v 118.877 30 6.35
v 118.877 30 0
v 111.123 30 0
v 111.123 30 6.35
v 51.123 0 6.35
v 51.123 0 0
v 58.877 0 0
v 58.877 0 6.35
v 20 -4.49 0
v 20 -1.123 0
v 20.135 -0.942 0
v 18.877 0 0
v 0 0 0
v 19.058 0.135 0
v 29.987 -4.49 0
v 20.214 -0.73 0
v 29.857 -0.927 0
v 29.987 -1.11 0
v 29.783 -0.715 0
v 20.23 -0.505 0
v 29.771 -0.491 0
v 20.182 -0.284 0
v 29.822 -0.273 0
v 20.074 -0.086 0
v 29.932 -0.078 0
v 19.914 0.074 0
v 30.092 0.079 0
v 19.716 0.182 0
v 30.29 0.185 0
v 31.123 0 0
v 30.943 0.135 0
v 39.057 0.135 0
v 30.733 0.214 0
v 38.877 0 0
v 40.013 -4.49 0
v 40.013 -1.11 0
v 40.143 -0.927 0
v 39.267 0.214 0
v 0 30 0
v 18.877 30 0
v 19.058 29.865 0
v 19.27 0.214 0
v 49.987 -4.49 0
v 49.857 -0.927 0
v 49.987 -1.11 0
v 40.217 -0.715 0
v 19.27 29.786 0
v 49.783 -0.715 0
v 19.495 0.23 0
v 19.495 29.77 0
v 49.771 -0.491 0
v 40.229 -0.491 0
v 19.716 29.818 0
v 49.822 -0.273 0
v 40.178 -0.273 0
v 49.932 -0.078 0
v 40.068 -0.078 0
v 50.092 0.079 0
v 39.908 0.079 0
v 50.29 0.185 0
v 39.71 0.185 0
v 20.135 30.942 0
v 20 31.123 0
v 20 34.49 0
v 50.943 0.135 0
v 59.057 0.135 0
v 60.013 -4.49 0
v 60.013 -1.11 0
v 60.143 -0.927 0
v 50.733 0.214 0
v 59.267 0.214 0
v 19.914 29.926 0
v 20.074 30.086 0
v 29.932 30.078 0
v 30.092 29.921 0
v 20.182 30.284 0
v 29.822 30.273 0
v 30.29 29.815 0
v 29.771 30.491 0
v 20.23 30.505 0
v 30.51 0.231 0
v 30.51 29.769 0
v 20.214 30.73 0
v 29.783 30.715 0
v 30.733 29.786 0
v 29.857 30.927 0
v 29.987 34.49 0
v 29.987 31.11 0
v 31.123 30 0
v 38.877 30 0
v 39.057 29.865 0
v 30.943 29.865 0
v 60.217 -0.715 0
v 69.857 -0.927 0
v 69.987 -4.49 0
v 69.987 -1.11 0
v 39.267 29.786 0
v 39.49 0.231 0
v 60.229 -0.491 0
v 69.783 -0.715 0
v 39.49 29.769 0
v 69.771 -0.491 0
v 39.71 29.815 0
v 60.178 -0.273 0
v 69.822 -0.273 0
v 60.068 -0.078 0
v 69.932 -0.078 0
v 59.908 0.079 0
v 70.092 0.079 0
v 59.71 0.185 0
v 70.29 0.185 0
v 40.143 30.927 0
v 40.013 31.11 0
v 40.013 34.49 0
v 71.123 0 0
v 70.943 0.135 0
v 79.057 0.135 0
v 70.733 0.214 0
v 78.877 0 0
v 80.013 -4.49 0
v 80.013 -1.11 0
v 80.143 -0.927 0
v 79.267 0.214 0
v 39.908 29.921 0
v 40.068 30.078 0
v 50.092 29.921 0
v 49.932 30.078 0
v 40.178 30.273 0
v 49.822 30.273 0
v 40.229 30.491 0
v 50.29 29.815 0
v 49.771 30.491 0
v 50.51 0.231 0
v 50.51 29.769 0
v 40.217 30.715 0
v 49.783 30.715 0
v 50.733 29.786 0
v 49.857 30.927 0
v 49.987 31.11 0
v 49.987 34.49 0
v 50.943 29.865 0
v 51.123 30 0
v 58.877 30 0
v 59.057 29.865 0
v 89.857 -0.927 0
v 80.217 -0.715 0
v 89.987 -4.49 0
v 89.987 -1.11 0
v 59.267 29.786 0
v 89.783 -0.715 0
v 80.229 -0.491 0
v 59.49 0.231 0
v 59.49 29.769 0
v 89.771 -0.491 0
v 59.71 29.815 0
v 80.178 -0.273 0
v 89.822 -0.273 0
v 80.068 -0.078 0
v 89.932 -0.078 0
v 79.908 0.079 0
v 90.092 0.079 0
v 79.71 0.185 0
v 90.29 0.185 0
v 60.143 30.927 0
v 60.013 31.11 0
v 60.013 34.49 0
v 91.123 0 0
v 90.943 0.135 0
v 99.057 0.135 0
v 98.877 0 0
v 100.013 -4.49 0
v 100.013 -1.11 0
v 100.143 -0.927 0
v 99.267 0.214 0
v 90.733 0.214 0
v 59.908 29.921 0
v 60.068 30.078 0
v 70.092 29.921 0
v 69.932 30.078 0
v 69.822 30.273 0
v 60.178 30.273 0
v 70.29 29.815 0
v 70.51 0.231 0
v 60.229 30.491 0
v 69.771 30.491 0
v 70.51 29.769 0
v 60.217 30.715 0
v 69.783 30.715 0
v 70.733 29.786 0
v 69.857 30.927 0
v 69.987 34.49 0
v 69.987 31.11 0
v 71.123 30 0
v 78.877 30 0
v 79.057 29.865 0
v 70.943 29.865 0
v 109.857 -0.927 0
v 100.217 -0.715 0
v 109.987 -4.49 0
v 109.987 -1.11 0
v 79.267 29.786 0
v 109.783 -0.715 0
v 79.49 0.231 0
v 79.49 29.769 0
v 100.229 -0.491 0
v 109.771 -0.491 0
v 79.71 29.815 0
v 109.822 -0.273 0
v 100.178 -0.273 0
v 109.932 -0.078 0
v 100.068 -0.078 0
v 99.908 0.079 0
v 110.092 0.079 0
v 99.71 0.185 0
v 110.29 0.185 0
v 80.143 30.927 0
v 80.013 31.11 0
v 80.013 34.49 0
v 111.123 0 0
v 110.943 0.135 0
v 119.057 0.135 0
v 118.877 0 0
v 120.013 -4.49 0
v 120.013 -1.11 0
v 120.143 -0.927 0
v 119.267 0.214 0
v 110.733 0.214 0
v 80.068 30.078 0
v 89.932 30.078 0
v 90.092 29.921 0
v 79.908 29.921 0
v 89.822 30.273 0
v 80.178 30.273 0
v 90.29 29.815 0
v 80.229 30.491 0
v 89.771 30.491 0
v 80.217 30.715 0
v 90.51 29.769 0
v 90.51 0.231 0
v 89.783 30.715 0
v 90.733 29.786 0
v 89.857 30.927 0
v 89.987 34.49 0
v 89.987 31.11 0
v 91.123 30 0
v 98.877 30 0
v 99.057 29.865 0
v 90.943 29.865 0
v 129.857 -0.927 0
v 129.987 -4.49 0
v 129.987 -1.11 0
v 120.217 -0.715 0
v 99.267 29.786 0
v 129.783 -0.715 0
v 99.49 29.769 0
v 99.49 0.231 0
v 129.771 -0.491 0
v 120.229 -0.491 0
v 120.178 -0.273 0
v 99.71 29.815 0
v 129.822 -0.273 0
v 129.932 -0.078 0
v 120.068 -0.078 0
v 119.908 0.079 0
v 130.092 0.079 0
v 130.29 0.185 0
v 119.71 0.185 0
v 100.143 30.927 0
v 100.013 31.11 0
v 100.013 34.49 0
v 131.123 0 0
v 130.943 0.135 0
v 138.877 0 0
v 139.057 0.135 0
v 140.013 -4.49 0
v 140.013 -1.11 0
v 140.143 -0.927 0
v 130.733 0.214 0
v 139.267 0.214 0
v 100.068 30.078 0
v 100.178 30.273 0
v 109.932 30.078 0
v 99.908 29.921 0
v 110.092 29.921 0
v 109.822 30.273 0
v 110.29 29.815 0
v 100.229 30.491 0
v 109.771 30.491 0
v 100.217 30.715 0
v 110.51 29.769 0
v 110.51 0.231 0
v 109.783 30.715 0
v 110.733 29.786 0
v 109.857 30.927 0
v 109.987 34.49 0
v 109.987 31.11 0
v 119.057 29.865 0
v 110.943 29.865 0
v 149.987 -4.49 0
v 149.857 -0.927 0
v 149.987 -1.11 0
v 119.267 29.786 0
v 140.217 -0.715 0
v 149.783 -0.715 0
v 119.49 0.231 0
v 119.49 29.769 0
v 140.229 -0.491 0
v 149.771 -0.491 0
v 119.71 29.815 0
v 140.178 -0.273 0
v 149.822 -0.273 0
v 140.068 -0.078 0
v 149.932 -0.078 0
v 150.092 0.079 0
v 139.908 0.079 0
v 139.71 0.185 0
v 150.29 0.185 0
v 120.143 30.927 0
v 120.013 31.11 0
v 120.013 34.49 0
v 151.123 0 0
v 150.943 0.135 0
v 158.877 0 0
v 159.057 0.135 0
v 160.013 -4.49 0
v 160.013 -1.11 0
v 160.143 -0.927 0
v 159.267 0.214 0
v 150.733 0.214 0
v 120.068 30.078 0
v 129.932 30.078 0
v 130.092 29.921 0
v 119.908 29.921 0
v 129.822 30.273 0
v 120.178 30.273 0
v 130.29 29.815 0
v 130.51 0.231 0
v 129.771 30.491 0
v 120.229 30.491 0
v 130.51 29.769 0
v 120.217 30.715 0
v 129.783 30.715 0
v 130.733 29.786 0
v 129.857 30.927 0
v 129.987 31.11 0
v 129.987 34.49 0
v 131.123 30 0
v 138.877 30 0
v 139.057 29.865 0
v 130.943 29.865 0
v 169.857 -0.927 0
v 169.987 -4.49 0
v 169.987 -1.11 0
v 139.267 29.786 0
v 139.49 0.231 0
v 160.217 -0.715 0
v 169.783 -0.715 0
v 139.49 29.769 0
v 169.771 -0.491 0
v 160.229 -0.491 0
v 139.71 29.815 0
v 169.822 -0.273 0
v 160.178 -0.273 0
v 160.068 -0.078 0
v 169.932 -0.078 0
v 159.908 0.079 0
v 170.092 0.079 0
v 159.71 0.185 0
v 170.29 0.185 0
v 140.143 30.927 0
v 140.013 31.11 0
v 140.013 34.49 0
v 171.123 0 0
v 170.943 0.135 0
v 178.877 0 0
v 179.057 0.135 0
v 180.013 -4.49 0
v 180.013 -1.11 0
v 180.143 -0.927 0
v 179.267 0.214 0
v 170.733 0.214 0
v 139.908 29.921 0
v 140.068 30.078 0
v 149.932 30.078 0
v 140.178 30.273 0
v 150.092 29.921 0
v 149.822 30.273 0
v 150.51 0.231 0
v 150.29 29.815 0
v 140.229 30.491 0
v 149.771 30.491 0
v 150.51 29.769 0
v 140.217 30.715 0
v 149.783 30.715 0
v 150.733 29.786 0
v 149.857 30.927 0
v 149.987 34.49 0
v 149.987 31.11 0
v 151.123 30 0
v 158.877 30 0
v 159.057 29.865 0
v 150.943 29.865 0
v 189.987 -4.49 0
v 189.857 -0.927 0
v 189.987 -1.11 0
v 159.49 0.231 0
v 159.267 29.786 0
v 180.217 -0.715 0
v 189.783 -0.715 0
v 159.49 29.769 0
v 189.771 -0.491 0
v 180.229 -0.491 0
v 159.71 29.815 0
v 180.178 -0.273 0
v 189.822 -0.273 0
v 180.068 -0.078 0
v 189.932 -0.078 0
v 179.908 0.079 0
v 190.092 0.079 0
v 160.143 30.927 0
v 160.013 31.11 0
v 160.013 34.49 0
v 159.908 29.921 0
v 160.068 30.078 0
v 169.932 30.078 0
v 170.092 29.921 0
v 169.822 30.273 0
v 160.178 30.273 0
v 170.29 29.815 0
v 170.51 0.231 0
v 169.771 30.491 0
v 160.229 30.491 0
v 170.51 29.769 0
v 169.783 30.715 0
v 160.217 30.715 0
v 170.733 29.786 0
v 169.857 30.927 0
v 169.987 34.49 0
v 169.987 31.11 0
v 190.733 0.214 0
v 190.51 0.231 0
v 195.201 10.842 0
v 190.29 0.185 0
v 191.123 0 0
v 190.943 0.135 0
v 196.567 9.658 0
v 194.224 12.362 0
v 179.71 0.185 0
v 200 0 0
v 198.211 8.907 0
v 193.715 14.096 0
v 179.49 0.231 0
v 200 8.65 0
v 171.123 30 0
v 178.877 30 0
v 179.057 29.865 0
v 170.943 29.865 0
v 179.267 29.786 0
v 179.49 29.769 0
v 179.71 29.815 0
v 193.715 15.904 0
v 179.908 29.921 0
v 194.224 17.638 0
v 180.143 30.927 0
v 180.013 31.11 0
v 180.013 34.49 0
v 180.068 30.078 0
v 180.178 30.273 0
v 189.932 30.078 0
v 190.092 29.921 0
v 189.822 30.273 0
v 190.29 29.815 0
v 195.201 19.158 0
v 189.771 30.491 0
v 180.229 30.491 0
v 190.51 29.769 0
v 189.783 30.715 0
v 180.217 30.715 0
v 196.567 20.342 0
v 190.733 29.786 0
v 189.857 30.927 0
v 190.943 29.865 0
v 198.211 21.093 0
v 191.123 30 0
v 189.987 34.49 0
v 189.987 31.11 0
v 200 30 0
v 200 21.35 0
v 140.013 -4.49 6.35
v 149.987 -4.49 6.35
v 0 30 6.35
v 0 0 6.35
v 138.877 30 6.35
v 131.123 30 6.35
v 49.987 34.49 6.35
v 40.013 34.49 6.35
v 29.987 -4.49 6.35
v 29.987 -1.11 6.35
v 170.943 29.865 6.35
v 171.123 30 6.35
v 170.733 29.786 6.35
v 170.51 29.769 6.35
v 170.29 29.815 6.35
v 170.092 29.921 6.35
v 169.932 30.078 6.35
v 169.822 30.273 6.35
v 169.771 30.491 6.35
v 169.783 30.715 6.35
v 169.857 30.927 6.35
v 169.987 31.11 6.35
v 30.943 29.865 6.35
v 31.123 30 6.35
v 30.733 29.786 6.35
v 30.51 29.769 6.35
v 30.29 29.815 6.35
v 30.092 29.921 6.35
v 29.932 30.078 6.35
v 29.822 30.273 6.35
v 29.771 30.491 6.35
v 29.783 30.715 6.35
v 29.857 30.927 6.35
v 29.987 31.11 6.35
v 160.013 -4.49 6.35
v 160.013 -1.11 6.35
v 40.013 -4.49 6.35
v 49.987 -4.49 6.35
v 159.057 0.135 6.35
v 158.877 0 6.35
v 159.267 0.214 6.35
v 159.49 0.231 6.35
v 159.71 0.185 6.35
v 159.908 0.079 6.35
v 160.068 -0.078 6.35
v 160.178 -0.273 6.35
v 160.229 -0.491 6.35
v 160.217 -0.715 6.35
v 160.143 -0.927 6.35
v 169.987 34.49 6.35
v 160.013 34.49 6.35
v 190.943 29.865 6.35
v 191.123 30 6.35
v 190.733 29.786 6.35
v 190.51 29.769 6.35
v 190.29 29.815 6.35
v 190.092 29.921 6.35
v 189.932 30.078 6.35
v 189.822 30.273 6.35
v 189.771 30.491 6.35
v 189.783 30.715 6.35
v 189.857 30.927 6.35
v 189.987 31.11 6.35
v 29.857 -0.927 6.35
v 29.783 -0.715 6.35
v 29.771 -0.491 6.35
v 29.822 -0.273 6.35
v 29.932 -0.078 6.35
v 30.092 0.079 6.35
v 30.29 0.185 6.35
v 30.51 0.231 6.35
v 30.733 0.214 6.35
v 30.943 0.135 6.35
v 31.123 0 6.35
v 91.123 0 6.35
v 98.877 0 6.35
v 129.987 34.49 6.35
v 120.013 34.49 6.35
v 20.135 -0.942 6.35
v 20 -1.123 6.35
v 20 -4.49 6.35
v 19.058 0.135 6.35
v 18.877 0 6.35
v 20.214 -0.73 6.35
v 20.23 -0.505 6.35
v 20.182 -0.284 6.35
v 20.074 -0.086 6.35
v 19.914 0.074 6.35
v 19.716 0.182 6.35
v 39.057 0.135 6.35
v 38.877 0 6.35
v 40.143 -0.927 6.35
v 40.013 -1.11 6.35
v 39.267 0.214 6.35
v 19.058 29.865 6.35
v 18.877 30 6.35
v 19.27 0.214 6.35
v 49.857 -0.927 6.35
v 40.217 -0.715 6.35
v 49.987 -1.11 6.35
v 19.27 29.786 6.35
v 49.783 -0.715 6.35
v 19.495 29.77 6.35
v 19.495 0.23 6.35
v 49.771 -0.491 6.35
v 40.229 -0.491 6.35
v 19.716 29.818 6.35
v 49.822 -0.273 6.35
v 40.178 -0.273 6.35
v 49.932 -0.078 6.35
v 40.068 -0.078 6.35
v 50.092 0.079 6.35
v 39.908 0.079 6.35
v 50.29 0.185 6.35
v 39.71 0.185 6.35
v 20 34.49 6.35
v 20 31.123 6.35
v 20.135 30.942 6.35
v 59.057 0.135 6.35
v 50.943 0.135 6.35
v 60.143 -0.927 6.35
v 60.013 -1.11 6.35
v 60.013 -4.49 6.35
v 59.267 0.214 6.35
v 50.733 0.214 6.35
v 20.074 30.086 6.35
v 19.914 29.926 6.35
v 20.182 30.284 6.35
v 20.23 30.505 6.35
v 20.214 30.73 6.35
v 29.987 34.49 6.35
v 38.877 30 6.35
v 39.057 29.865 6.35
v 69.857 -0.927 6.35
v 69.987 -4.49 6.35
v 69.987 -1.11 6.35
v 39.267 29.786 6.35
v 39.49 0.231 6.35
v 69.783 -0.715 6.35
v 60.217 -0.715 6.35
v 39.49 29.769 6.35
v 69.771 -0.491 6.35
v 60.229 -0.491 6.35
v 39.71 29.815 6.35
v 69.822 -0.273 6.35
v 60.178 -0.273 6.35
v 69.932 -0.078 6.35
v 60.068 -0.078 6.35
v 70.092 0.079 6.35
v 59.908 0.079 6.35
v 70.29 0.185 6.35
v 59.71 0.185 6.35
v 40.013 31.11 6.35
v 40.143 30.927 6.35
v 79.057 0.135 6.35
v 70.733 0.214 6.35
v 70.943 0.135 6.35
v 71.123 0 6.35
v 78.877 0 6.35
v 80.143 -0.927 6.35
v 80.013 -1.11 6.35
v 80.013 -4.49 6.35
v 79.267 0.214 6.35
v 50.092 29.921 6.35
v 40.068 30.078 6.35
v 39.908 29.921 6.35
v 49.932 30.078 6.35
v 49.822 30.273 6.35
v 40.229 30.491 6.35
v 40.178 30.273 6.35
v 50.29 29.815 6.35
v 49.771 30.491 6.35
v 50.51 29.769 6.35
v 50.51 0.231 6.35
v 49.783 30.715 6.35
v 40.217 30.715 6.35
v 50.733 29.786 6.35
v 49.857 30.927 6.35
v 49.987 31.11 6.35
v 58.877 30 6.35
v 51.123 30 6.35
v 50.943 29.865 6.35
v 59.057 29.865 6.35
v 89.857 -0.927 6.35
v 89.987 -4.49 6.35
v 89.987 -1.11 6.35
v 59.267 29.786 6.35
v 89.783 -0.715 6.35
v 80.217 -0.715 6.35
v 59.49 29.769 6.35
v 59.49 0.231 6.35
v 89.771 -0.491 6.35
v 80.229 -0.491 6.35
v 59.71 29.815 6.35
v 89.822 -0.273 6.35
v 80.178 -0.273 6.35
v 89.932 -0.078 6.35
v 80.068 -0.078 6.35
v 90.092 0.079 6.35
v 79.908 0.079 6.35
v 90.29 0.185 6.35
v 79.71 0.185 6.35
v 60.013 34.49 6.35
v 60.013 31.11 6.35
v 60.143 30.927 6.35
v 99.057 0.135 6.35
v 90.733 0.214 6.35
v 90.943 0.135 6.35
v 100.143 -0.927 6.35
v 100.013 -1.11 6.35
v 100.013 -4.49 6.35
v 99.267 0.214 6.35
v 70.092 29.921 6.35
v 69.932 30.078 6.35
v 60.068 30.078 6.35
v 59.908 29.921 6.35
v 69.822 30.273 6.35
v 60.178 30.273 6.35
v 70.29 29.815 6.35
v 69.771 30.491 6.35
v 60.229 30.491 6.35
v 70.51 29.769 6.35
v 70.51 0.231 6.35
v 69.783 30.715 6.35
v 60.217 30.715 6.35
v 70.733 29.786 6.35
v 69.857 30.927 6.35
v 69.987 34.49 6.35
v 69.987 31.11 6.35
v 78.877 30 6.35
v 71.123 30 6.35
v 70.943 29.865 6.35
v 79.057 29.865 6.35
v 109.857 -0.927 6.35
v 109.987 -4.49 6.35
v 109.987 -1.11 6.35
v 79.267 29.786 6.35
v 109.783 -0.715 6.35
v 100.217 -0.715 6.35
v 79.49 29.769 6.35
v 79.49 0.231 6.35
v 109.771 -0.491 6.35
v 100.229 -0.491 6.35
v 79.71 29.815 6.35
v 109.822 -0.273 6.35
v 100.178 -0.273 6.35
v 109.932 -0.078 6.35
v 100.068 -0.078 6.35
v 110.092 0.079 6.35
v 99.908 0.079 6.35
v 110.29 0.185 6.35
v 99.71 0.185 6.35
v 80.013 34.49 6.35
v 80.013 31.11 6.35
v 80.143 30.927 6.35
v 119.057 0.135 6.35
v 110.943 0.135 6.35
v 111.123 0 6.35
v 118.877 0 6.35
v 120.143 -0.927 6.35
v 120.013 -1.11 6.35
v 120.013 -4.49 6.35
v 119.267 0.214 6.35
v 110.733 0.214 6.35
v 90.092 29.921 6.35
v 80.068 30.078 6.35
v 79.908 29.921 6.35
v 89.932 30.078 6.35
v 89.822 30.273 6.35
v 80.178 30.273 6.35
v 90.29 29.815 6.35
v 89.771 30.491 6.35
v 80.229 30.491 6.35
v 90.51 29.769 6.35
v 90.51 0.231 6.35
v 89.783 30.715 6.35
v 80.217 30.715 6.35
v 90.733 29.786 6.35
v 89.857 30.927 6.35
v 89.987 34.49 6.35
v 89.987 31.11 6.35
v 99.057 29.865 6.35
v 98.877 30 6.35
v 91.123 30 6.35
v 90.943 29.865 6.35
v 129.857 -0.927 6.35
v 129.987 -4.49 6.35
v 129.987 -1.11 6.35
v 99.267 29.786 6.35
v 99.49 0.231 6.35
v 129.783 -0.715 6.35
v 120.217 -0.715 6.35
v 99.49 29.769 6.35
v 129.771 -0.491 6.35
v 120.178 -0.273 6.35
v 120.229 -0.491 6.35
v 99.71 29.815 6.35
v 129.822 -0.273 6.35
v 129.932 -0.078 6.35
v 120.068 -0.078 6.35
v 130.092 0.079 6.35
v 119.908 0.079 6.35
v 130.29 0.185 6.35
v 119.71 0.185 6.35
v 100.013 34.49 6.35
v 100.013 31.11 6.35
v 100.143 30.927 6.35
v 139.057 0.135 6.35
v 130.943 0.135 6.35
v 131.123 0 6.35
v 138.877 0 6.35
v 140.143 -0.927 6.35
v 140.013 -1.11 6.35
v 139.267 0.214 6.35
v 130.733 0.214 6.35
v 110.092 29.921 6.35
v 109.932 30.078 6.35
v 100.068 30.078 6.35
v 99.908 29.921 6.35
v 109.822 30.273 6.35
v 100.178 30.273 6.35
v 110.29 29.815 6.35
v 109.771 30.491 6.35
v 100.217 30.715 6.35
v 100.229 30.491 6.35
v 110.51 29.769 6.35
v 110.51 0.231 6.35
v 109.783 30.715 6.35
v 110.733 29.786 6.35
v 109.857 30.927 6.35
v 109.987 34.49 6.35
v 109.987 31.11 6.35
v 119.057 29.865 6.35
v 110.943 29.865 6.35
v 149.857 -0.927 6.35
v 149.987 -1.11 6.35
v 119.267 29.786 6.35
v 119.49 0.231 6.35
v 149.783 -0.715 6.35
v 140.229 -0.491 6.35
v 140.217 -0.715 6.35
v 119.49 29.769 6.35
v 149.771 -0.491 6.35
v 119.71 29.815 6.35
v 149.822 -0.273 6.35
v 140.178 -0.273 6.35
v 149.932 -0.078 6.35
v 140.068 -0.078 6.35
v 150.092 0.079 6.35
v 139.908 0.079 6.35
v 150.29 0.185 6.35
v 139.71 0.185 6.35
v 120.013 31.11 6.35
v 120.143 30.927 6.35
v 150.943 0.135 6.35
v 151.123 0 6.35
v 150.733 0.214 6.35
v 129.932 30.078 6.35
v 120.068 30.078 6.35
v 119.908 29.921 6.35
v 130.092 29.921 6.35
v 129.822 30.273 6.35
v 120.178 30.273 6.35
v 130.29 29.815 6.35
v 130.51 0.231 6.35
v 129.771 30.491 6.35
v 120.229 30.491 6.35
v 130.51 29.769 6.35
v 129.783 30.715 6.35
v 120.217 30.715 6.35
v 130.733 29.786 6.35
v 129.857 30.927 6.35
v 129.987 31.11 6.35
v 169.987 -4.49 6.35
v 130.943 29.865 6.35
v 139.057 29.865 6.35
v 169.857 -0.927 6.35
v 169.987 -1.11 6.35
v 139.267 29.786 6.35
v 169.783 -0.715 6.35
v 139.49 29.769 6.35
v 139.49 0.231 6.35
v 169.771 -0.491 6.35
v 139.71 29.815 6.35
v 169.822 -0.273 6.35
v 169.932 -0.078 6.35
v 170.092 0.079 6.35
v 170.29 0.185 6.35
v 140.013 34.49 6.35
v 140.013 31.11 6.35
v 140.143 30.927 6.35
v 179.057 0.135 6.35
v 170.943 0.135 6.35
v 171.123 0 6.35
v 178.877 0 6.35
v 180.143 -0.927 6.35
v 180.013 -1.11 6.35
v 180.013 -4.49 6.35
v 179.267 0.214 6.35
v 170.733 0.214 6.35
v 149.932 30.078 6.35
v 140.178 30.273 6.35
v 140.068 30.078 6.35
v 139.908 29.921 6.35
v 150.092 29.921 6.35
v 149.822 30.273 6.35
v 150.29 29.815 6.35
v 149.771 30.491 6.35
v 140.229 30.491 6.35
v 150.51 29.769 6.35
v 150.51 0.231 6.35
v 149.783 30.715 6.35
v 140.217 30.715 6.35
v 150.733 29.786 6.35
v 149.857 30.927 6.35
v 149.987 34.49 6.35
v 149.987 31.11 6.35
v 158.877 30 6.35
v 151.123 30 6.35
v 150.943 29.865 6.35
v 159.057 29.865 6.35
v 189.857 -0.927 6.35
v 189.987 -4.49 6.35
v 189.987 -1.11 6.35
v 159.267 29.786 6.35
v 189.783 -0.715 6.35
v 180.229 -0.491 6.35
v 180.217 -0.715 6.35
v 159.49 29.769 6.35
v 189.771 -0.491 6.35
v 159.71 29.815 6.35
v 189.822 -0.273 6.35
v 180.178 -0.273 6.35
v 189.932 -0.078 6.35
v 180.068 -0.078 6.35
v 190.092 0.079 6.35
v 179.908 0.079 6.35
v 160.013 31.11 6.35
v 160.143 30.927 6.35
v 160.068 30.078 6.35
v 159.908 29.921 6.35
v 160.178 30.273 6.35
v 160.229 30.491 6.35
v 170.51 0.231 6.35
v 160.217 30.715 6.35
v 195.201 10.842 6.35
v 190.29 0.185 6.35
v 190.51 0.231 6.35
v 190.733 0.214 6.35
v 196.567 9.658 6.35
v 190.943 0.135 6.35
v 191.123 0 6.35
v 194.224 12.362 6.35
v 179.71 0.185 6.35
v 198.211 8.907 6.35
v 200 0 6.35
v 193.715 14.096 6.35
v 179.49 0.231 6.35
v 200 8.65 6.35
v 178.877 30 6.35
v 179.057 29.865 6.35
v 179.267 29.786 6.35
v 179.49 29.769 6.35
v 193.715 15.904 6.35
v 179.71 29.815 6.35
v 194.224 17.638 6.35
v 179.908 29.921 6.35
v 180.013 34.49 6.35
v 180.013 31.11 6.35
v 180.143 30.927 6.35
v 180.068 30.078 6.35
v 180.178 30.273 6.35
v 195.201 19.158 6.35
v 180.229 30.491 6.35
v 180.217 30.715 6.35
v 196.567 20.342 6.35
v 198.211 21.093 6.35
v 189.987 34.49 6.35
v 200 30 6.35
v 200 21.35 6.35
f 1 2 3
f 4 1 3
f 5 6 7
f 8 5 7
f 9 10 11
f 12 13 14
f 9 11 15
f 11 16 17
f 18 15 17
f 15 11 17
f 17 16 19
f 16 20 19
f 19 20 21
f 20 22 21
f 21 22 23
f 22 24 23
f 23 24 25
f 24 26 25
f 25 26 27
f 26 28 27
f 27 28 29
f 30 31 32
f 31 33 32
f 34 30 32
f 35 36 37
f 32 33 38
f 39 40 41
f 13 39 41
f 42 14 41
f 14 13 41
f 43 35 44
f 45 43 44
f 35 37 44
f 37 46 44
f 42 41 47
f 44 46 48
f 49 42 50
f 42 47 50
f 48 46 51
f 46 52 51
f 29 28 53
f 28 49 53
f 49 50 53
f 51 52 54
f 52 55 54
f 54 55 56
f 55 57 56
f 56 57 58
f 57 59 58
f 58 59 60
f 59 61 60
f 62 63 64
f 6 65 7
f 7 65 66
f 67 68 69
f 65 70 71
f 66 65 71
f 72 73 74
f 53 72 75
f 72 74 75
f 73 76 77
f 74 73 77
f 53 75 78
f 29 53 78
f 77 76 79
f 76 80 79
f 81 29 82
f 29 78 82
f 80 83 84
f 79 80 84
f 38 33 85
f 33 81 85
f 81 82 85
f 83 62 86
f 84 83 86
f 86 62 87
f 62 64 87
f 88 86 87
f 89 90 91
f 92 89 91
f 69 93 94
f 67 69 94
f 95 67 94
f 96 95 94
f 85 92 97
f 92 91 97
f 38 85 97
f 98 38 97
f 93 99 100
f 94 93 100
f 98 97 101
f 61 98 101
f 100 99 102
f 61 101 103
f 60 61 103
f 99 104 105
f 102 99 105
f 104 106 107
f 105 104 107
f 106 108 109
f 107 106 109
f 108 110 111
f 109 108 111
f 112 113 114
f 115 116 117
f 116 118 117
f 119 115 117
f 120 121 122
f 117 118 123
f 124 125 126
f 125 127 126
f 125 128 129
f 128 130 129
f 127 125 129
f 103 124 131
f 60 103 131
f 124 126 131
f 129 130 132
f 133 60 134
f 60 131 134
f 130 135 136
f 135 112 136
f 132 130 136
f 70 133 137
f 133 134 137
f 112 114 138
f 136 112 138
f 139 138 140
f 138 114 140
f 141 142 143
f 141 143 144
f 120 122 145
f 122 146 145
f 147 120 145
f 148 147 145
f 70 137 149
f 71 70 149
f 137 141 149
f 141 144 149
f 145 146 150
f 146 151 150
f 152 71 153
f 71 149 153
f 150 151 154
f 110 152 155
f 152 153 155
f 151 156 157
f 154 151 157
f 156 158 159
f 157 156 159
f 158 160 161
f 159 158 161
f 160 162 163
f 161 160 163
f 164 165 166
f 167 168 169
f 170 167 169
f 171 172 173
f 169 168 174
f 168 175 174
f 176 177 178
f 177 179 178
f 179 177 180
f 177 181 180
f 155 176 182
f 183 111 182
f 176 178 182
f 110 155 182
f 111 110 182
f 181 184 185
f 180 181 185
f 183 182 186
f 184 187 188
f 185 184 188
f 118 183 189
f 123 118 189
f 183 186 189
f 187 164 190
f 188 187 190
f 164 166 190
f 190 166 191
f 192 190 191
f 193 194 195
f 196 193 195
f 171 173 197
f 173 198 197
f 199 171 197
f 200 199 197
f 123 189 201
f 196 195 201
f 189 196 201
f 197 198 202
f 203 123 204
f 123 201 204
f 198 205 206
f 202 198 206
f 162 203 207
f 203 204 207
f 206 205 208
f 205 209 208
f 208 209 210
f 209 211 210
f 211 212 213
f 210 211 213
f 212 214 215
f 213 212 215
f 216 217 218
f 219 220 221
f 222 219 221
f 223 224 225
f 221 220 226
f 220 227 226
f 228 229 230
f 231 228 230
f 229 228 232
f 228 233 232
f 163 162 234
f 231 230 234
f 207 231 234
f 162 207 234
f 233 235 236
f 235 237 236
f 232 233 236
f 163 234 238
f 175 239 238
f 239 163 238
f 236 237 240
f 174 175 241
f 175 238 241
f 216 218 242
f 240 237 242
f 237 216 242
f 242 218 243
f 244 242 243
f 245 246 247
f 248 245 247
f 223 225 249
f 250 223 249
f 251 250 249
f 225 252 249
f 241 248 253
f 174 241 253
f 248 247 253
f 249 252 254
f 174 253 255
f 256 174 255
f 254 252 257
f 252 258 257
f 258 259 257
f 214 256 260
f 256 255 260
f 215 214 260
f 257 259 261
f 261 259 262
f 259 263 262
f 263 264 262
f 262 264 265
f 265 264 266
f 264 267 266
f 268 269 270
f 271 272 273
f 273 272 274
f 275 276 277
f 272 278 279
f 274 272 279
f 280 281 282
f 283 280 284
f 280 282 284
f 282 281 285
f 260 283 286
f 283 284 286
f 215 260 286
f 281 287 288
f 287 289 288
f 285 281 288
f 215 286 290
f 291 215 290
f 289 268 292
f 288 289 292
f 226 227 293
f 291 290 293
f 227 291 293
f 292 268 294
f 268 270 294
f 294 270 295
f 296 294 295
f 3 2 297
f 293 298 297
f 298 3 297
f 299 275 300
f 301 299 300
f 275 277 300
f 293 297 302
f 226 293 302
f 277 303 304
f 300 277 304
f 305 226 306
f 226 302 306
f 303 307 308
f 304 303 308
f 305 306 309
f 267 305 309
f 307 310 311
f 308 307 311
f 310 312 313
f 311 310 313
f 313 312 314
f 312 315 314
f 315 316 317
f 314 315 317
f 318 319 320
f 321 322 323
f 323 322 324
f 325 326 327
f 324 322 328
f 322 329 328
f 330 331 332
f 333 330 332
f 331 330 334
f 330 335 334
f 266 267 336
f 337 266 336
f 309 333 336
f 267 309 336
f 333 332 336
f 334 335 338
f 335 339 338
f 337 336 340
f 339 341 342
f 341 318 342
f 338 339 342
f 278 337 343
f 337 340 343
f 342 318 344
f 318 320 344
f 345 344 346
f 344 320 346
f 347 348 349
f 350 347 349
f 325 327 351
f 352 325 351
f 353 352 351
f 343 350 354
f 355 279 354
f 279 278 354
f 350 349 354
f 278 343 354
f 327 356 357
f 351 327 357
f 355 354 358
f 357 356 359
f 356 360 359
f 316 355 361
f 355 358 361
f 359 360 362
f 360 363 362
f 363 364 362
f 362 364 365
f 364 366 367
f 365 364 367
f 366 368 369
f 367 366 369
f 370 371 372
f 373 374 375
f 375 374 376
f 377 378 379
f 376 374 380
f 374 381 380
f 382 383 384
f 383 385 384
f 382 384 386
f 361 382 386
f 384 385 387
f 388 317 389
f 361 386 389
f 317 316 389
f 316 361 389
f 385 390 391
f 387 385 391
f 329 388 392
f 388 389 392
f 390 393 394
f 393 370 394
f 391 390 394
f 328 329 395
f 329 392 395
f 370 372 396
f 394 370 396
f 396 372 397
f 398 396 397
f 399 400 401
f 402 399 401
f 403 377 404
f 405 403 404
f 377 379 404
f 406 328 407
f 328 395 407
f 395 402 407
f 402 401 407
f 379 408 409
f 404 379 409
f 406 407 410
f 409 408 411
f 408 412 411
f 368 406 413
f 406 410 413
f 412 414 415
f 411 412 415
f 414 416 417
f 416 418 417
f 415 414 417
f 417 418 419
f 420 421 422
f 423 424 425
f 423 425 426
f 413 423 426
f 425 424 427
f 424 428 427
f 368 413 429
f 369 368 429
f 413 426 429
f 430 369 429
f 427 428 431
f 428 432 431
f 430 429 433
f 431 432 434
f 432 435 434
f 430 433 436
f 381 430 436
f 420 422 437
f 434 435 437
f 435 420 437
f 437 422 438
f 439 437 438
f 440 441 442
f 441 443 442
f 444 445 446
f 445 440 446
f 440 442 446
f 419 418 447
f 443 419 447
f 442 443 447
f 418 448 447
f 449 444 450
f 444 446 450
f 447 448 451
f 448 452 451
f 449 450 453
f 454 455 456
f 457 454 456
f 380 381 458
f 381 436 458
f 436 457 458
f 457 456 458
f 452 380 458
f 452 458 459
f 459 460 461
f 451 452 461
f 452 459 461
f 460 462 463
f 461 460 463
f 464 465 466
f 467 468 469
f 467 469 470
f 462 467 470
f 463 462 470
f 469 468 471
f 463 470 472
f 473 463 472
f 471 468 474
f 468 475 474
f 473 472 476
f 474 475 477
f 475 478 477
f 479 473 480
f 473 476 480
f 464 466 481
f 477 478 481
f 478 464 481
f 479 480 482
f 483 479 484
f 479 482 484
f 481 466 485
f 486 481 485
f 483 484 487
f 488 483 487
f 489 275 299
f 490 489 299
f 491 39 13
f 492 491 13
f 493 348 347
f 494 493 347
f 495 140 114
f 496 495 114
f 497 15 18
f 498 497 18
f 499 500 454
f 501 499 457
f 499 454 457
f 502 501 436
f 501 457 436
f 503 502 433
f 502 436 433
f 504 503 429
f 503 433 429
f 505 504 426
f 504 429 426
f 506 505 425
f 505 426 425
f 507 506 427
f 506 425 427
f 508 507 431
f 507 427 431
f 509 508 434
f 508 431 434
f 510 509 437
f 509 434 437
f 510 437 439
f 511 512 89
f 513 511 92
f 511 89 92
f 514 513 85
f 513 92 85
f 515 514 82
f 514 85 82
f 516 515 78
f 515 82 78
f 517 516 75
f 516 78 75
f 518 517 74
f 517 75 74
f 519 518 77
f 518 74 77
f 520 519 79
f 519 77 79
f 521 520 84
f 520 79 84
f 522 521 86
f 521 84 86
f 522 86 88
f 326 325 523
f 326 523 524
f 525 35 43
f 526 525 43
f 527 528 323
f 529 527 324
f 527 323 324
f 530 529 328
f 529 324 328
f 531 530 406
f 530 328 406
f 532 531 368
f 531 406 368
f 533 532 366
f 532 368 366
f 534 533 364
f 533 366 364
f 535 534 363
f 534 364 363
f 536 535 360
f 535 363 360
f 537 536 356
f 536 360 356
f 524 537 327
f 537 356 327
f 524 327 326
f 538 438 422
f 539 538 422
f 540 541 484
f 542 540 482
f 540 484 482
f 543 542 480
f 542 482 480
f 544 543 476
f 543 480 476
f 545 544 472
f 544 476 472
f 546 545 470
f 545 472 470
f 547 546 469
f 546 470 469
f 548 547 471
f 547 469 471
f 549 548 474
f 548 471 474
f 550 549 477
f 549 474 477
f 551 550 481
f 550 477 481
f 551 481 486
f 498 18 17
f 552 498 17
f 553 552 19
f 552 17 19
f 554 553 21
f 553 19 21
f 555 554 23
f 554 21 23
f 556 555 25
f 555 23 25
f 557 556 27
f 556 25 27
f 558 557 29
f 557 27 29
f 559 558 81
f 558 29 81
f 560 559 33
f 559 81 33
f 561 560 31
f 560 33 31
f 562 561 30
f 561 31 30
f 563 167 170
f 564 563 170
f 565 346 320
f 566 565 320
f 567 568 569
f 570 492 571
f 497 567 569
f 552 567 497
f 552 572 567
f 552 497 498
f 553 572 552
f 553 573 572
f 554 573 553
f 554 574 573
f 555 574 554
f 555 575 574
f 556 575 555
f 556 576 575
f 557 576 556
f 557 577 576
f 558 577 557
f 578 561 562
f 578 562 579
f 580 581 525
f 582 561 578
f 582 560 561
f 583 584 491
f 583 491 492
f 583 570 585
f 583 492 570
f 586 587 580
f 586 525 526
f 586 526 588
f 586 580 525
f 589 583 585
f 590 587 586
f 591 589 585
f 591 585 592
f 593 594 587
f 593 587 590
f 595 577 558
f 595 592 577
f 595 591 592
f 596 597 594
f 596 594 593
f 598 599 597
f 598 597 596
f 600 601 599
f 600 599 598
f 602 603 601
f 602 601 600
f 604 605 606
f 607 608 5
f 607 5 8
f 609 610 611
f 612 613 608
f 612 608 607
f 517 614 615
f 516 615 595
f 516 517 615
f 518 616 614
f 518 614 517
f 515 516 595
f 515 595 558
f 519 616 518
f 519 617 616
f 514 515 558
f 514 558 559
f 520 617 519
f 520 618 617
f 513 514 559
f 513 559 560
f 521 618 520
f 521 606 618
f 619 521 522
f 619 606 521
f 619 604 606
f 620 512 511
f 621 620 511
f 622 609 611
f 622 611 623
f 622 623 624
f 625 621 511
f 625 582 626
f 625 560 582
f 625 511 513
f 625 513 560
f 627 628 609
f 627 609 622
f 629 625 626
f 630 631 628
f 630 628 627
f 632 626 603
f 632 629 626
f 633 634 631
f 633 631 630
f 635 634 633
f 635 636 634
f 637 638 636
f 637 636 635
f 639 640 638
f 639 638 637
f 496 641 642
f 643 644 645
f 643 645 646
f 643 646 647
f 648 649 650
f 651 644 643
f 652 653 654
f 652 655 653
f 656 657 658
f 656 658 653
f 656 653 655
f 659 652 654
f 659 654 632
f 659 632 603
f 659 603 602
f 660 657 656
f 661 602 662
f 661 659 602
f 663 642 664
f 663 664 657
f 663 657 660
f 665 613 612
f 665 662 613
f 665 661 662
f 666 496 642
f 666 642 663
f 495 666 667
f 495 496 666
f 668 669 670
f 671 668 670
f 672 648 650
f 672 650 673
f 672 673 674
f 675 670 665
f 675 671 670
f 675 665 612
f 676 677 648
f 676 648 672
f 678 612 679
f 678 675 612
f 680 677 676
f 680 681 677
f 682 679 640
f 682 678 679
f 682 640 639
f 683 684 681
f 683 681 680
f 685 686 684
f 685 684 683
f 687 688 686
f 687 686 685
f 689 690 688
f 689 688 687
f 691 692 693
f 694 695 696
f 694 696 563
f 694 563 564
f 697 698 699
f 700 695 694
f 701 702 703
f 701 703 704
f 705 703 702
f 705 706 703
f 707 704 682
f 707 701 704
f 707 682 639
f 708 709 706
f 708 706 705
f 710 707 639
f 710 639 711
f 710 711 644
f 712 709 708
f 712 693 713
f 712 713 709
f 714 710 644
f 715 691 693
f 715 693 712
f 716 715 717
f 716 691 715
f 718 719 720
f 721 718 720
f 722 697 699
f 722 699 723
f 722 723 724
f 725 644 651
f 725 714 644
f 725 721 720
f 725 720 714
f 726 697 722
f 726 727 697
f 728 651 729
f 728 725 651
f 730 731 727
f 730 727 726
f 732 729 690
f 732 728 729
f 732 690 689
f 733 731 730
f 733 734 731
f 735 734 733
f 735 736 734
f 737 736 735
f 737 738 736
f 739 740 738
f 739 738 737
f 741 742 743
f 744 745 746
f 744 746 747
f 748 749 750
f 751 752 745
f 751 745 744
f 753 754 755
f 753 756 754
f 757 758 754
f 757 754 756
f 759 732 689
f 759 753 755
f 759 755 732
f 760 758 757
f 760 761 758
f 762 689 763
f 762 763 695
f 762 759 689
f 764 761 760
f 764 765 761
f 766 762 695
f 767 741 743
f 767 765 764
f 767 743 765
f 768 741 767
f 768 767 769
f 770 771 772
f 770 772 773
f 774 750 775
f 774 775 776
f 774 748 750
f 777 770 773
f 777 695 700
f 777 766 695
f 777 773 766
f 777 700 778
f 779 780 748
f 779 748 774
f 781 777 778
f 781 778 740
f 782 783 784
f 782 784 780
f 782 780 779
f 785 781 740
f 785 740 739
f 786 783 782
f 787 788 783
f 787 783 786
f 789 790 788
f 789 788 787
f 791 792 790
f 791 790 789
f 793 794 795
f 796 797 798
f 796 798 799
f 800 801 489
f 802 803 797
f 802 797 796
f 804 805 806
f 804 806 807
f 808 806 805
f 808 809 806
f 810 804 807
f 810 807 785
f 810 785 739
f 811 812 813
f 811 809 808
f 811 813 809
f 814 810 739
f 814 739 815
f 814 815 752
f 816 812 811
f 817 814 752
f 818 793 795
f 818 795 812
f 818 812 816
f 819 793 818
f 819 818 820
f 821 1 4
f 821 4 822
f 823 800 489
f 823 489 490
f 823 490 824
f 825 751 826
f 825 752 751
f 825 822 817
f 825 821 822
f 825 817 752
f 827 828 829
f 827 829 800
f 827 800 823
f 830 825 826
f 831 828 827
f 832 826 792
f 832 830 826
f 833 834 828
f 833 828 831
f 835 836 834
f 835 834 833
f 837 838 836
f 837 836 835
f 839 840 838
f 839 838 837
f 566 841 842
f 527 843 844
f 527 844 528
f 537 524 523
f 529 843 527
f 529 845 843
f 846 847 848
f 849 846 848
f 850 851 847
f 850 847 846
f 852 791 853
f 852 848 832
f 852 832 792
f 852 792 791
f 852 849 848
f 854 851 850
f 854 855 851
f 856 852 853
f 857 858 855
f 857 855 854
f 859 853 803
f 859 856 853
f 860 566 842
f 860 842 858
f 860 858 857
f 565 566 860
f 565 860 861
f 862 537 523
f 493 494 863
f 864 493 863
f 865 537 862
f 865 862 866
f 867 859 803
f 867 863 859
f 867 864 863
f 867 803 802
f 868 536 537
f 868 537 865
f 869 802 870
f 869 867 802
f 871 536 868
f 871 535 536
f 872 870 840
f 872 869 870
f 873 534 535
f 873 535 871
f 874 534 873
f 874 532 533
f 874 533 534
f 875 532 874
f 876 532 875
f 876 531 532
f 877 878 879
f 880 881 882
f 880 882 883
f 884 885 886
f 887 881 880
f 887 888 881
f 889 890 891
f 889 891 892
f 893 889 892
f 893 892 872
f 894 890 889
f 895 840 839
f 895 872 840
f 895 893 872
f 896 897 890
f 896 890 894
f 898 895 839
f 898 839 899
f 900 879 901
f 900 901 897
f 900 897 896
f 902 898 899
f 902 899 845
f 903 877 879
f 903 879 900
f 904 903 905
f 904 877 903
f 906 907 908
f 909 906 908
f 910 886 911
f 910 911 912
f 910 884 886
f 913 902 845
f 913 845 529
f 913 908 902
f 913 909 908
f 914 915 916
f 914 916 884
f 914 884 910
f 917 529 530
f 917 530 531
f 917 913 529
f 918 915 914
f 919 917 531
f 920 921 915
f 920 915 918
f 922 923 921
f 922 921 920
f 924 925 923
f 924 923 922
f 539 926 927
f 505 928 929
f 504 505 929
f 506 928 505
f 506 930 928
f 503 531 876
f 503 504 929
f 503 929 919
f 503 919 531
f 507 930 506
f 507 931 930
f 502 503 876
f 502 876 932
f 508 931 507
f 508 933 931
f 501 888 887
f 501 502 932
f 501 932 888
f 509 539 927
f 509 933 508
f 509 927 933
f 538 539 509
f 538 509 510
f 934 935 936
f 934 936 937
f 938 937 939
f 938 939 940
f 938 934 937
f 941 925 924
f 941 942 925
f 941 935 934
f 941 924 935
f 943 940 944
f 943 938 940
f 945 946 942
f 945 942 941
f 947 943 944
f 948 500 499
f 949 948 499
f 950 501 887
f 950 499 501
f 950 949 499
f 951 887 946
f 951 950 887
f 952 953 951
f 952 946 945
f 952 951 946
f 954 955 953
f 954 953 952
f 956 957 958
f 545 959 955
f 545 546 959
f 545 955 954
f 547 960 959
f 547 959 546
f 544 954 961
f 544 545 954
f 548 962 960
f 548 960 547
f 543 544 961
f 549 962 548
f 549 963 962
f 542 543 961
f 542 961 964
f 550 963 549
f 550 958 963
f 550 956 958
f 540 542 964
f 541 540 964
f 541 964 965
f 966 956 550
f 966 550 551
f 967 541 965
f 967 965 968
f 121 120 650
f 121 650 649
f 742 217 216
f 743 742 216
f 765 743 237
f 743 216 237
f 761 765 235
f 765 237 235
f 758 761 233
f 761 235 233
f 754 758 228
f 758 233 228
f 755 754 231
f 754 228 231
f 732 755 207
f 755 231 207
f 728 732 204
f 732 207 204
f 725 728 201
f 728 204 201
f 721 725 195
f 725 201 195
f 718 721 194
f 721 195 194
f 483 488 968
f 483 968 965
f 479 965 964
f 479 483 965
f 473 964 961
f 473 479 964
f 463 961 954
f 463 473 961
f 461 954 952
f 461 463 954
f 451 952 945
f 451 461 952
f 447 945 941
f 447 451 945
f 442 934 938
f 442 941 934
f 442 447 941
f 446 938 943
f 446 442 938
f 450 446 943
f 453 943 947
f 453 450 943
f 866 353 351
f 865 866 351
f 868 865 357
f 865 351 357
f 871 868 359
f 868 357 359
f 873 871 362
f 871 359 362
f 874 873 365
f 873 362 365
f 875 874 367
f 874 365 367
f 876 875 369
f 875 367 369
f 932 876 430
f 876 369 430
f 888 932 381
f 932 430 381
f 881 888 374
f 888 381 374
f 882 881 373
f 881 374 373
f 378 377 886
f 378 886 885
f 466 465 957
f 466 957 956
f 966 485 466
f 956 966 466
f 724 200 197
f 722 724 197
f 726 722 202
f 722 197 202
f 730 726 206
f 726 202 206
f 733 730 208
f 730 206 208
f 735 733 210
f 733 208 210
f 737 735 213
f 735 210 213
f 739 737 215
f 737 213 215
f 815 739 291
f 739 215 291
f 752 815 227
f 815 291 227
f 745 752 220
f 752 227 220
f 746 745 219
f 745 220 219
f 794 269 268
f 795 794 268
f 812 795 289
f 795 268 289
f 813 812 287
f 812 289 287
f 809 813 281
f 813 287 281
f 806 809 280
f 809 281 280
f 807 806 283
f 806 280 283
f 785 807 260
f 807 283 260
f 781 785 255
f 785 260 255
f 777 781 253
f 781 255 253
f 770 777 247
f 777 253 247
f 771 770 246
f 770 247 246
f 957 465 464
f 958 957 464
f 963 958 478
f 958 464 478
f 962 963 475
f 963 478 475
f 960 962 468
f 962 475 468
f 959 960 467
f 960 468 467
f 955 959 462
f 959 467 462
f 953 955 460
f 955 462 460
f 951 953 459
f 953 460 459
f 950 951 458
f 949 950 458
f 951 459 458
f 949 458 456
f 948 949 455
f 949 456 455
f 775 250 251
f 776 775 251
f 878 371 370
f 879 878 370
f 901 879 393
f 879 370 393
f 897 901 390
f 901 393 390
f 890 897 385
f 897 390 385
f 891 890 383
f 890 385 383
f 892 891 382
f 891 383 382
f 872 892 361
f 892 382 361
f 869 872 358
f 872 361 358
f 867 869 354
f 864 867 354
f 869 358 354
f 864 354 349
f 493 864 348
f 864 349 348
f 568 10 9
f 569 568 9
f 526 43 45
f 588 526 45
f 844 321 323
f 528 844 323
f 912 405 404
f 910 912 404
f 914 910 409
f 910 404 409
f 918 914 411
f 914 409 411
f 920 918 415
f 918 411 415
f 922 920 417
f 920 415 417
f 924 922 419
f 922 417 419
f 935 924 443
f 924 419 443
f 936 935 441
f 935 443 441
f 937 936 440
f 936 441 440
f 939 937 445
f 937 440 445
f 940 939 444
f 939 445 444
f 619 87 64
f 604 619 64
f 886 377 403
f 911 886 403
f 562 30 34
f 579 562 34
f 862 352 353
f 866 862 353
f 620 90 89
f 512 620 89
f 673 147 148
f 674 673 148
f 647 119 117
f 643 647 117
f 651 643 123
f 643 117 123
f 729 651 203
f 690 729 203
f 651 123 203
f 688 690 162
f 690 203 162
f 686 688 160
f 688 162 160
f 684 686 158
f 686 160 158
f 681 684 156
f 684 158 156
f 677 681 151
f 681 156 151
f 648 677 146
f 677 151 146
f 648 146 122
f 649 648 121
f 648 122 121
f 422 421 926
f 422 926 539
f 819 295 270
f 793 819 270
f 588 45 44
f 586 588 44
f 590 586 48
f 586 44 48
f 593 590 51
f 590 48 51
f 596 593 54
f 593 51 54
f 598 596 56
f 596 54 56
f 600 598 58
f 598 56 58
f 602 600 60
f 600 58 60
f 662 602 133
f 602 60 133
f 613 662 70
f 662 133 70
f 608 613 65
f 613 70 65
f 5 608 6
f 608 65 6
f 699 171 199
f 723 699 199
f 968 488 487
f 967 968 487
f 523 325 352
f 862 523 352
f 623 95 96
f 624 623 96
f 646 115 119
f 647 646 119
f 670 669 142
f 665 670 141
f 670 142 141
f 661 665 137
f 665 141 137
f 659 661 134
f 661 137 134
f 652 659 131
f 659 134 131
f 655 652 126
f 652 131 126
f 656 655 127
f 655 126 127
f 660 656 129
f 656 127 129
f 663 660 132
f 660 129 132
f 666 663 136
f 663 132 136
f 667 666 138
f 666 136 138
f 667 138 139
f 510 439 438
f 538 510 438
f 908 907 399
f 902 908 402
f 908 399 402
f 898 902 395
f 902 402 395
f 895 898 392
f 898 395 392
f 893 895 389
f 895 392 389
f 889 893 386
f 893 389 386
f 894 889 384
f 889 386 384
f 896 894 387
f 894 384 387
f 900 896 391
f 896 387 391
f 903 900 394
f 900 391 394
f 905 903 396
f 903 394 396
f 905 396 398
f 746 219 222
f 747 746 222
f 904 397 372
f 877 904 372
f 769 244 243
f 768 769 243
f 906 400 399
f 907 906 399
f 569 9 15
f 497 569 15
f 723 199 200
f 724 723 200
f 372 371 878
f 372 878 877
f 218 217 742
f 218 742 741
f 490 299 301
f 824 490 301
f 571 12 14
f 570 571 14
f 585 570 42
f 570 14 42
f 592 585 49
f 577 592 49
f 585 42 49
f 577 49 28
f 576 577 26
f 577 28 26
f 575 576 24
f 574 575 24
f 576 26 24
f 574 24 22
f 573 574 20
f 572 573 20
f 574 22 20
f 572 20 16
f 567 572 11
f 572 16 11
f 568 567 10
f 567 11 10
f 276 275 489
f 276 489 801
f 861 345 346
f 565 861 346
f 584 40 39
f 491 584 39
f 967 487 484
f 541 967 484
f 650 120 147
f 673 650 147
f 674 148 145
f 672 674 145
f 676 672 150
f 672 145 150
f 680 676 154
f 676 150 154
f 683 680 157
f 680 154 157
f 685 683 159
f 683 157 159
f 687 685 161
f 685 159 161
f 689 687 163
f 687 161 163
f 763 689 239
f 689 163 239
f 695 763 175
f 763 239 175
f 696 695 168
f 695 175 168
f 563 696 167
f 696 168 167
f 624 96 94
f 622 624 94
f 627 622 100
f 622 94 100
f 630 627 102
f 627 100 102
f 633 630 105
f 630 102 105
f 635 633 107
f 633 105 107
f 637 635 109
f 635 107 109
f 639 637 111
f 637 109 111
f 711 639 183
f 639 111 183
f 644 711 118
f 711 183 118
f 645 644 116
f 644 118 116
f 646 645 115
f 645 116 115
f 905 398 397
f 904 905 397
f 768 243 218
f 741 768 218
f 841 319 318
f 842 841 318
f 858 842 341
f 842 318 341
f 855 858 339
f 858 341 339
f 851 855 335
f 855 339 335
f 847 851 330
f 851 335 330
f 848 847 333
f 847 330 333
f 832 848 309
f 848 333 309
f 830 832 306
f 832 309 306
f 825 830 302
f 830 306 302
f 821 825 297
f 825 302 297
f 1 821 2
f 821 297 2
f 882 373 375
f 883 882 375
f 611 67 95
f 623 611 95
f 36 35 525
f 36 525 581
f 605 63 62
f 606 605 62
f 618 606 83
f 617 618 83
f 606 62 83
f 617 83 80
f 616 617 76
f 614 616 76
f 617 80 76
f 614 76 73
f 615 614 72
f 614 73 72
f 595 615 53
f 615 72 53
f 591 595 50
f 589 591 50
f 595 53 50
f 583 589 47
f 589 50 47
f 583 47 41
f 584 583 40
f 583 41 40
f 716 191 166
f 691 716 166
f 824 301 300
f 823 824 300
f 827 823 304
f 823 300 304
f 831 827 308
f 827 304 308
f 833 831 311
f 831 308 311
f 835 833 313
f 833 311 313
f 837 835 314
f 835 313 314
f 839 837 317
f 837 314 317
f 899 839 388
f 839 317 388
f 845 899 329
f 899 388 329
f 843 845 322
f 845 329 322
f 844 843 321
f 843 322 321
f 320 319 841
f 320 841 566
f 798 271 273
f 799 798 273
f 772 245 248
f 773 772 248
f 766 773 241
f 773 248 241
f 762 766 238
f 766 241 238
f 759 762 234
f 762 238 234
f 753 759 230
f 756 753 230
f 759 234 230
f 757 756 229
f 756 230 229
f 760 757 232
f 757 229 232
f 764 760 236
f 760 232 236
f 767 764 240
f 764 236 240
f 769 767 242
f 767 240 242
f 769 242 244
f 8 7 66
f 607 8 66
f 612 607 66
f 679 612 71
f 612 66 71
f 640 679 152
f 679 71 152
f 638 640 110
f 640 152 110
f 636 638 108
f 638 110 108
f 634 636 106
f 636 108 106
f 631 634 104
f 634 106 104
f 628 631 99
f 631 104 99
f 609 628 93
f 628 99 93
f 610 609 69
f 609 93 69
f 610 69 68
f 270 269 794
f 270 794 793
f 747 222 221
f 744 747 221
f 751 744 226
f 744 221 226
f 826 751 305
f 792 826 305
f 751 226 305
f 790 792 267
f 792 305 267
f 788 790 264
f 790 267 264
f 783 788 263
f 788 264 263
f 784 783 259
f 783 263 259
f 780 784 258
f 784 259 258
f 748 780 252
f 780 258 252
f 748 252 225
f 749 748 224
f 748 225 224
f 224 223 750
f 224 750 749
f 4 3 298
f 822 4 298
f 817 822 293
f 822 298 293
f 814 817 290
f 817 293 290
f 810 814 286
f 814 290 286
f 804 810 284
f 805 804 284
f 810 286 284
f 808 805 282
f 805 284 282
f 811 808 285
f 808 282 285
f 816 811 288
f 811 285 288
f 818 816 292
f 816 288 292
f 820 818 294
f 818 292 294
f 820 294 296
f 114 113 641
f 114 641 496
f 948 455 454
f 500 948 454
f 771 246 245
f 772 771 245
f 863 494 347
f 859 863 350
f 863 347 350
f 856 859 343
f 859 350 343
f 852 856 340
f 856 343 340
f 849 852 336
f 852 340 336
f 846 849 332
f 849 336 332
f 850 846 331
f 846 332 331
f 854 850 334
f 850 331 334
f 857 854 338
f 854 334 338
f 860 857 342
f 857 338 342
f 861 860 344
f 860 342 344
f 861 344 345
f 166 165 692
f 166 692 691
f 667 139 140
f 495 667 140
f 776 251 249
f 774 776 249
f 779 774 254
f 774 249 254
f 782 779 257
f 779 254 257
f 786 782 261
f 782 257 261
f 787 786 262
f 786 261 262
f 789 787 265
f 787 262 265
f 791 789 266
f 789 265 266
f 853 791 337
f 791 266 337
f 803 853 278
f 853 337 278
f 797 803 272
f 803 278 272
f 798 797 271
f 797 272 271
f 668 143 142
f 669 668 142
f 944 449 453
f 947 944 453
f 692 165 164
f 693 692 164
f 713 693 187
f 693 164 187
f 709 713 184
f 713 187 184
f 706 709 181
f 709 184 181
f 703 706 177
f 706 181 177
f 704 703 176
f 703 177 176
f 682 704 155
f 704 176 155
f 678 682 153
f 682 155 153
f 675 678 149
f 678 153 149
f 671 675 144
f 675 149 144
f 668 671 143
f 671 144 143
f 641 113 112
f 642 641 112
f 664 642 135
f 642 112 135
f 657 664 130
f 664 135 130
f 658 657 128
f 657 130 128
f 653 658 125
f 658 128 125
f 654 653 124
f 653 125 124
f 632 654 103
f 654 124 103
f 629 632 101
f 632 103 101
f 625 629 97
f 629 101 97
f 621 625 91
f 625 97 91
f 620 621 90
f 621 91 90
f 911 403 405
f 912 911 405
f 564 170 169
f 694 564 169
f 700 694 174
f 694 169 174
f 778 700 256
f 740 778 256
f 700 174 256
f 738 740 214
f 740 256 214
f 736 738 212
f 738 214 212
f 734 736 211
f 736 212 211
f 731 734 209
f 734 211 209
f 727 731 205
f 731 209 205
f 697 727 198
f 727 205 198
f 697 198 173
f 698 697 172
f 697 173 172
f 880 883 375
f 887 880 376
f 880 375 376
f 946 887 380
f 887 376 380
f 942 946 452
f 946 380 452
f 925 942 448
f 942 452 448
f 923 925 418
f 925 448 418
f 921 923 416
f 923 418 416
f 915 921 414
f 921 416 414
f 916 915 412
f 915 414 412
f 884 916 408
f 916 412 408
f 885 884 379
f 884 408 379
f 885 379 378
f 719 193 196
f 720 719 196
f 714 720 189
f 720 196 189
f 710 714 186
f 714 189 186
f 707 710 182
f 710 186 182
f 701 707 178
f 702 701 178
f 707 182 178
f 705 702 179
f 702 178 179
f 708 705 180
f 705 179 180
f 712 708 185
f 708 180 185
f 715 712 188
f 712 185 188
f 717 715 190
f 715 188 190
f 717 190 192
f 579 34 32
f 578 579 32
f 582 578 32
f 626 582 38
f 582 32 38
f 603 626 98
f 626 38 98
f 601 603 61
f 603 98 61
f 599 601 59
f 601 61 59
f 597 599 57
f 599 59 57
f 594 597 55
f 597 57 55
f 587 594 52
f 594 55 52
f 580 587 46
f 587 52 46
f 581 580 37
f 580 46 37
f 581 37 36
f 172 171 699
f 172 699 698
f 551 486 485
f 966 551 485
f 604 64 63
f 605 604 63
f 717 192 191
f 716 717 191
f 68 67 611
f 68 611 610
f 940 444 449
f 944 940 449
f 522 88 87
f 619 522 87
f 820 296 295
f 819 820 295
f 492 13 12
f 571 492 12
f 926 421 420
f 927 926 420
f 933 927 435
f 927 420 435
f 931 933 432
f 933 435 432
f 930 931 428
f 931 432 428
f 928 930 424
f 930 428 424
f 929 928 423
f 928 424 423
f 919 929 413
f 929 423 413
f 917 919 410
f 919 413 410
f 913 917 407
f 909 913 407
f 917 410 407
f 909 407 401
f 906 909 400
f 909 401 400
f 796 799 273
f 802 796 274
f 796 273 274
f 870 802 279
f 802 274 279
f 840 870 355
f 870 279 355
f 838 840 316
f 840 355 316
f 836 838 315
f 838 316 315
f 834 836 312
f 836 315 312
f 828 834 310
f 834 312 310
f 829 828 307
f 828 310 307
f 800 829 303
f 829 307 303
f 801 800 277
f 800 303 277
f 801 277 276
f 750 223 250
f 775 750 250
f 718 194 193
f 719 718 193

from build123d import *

# Parameters (mm, degrees)
BOSS_EXTRUDE1_DEPTH = 6.35
SKETCH2_W           = 10.0254
SKETCH2_H           = 4.477133961
CUT_EXTRUDE2_DEPTH  = 204.051450213
LPATTERN1_COUNT     = 9
LPATTERN1_PITCH     = 20
CUT_EXTRUDE5_DEPTH  = 204.051450213


# Read off the part's stored shape, not the designer's step: Boss-Extrude1
with BuildPart() as part:
    # Boss-Extrude1 outline → Boss-Extrude1 (new body)
    with BuildSketch(Plane.XY):
        with BuildLine():
            Line((190, -4.490128061), (190, -1.122532015))
            ThreePointArc((190, -1.122532015), (190, 0), (191.122532015, 0))
            Line((191.122532015, 0), (200, 0))
            Line((200, 0), (200, 30))
            Line((200, 30), (191.122532015, 30))
            ThreePointArc((191.122532015, 30), (190, 30), (190, 31.122532015))
            Line((190, 31.122532015), (190, 34.490128061))
            Line((190, 34.490128061), (180, 34.490128061))
            Line((180, 34.490128061), (180, 31.122532015))
            ThreePointArc((180, 31.122532015), (180, 30), (178.877467985, 30))
            Line((178.877467985, 30), (171.122532015, 30))
            ThreePointArc((171.122532015, 30), (170, 30), (170, 31.122532015))
            Line((170, 31.122532015), (170, 34.490128061))
            Line((170, 34.490128061), (160, 34.490128061))
            Line((160, 34.490128061), (160, 31.122532015))
            ThreePointArc((160, 31.122532015), (160, 30), (158.877467985, 30))
            Line((158.877467985, 30), (151.122532015, 30))
            ThreePointArc((151.122532015, 30), (150, 30), (150, 31.122532015))
            Line((150, 31.122532015), (150, 34.490128061))
            Line((150, 34.490128061), (140, 34.490128061))
            Line((140, 34.490128061), (140, 31.122532015))
            ThreePointArc((140, 31.122532015), (140, 30), (138.877467985, 30))
            Line((138.877467985, 30), (131.122532015, 30))
            ThreePointArc((131.122532015, 30), (130, 30), (130, 31.122532015))
            Line((130, 31.122532015), (130, 34.490128061))
            Line((130, 34.490128061), (120, 34.490128061))
            Line((120, 34.490128061), (120, 31.122532015))
            ThreePointArc((120, 31.122532015), (120, 30), (118.877467985, 30))
            Line((118.877467985, 30), (111.122532015, 30))
            ThreePointArc((111.122532015, 30), (110, 30), (110, 31.122532015))
            Line((110, 31.122532015), (110, 34.490128061))
            Line((110, 34.490128061), (100, 34.490128061))
            Line((100, 34.490128061), (100, 31.122532015))
            ThreePointArc((100, 31.122532015), (100, 30), (98.877467985, 30))
            Line((98.877467985, 30), (91.122532015, 30))
            ThreePointArc((91.122532015, 30), (90, 30), (90, 31.122532015))
            Line((90, 31.122532015), (90, 34.490128061))
            Line((90, 34.490128061), (80, 34.490128061))
            Line((80, 34.490128061), (80, 31.122532015))
            ThreePointArc((80, 31.122532015), (80, 30), (78.877467985, 30))
            Line((78.877467985, 30), (71.122532015, 30))
            ThreePointArc((71.122532015, 30), (70, 30), (70, 31.122532015))
            Line((70, 31.122532015), (70, 34.490128061))
            Line((70, 34.490128061), (60, 34.490128061))
            Line((60, 34.490128061), (60, 31.122532015))
            ThreePointArc((60, 31.122532015), (60, 30), (58.877467985, 30))
            Line((58.877467985, 30), (51.122532015, 30))
            ThreePointArc((51.122532015, 30), (50, 30), (50, 31.122532015))
            Line((50, 31.122532015), (50, 34.490128061))
            Line((50, 34.490128061), (40, 34.490128061))
            Line((40, 34.490128061), (40, 31.122532015))
            ThreePointArc((40, 31.122532015), (40, 30), (38.877467985, 30))
            Line((38.877467985, 30), (31.122532015, 30))
            ThreePointArc((31.122532015, 30), (30, 30), (30, 31.122532015))
            Line((30, 31.122532015), (30, 34.490128061))
            Line((30, 34.490128061), (20, 34.490128061))
            Line((20, 34.490128061), (20, 31.122532015))
            ThreePointArc((20, 31.122532015), (20, 30), (18.877467985, 30))
            Line((18.877467985, 30), (0, 30))
            Line((0, 30), (0, 0))
            Line((0, 0), (18.877467985, 0))
            ThreePointArc((18.877467985, 0), (20, 0), (20, -1.122532015))
            Line((20, -1.122532015), (20, -4.490128061))
            Line((20, -4.490128061), (30, -4.490128061))
            Line((30, -4.490128061), (30, -1.122532015))
            ThreePointArc((30, -1.122532015), (30, 0), (31.122532015, 0))
            Line((31.122532015, 0), (38.877467985, 0))
            ThreePointArc((38.877467985, 0), (40, 0), (40, -1.122532015))
            Line((40, -1.122532015), (40, -4.490128061))
            Line((40, -4.490128061), (50, -4.490128061))
            Line((50, -4.490128061), (50, -1.122532015))
            ThreePointArc((50, -1.122532015), (50, 0), (51.122532015, 0))
            Line((51.122532015, 0), (58.877467985, 0))
            ThreePointArc((58.877467985, 0), (60, 0), (60, -1.122532015))
            Line((60, -1.122532015), (60, -4.490128061))
            Line((60, -4.490128061), (70, -4.490128061))
            Line((70, -4.490128061), (70, -1.122532015))
            ThreePointArc((70, -1.122532015), (70, 0), (71.122532015, 0))
            Line((71.122532015, 0), (78.877467985, 0))
            ThreePointArc((78.877467985, 0), (80, 0), (80, -1.122532015))
            Line((80, -1.122532015), (80, -4.490128061))
            Line((80, -4.490128061), (90, -4.490128061))
            Line((90, -4.490128061), (90, -1.122532015))
            ThreePointArc((90, -1.122532015), (90, 0), (91.122532015, 0))
            Line((91.122532015, 0), (98.877467985, 0))
            ThreePointArc((98.877467985, 0), (100, 0), (100, -1.122532015))
            Line((100, -1.122532015), (100, -4.490128061))
            Line((100, -4.490128061), (110, -4.490128061))
            Line((110, -4.490128061), (110, -1.122532015))
            ThreePointArc((110, -1.122532015), (110, 0), (111.122532015, 0))
            Line((111.122532015, 0), (118.877467985, 0))
            ThreePointArc((118.877467985, 0), (120, 0), (120, -1.122532015))
            Line((120, -1.122532015), (120, -4.490128061))
            Line((120, -4.490128061), (130, -4.490128061))
            Line((130, -4.490128061), (130, -1.122532015))
            ThreePointArc((130, -1.122532015), (130, 0), (131.122532015, 0))
            Line((131.122532015, 0), (138.877467985, 0))
            ThreePointArc((138.877467985, 0), (140, 0), (140, -1.122532015))
            Line((140, -1.122532015), (140, -4.490128061))
            Line((140, -4.490128061), (150, -4.490128061))
            Line((150, -4.490128061), (150, -1.122532015))
            ThreePointArc((150, -1.122532015), (150, 0), (151.122532015, 0))
            Line((151.122532015, 0), (158.877467985, 0))
            ThreePointArc((158.877467985, 0), (160, 0), (160, -1.122532015))
            Line((160, -1.122532015), (160, -4.490128061))
            Line((160, -4.490128061), (170, -4.490128061))
            Line((170, -4.490128061), (170, -1.122532015))
            ThreePointArc((170, -1.122532015), (170, 0), (171.122532015, 0))
            Line((171.122532015, 0), (178.877467985, 0))
            ThreePointArc((178.877467985, 0), (180, 0), (180, -1.122532015))
            Line((180, -1.122532015), (180, -4.490128061))
            Line((180, -4.490128061), (190, -4.490128061))
        make_face()
    extrude(amount=BOSS_EXTRUDE1_DEPTH)

    # Sketch2 → Cut-Extrude2 (cut, through all)
    with BuildSketch(Plane(origin=(0, 0, 0), x_dir=(-1, 0, 0), z_dir=(0, 0, -1))):
        with Locations((-35, 32.25156108)):
            Rectangle(SKETCH2_W, SKETCH2_H)
        with Locations((-35, -2.251561081)):
            Rectangle(SKETCH2_W, SKETCH2_H)
    cut_extrude2 = extrude(amount=-CUT_EXTRUDE2_DEPTH, mode=Mode.SUBTRACT)

    # LPattern1: Cut-Extrude2 ×9
    with Locations(*[(i * LPATTERN1_PITCH, 0, 0) for i in range(1, LPATTERN1_COUNT)]):
        add(cut_extrude2, mode=Mode.SUBTRACT)

    # Sketch6 → Cut-Extrude5 (cut, through all)
    with BuildSketch(Plane(origin=(0, 0, 0), x_dir=(-1, 0, 0), z_dir=(0, 0, -1))):
        with BuildLine():
            Line((-200, 8.65), (-200, 21.35))
            ThreePointArc((-200, 21.35), (-193.65, 15), (-200, 8.65))
        make_face()
    extrude(amount=-CUT_EXTRUDE5_DEPTH, mode=Mode.SUBTRACT)


solid = part.part
